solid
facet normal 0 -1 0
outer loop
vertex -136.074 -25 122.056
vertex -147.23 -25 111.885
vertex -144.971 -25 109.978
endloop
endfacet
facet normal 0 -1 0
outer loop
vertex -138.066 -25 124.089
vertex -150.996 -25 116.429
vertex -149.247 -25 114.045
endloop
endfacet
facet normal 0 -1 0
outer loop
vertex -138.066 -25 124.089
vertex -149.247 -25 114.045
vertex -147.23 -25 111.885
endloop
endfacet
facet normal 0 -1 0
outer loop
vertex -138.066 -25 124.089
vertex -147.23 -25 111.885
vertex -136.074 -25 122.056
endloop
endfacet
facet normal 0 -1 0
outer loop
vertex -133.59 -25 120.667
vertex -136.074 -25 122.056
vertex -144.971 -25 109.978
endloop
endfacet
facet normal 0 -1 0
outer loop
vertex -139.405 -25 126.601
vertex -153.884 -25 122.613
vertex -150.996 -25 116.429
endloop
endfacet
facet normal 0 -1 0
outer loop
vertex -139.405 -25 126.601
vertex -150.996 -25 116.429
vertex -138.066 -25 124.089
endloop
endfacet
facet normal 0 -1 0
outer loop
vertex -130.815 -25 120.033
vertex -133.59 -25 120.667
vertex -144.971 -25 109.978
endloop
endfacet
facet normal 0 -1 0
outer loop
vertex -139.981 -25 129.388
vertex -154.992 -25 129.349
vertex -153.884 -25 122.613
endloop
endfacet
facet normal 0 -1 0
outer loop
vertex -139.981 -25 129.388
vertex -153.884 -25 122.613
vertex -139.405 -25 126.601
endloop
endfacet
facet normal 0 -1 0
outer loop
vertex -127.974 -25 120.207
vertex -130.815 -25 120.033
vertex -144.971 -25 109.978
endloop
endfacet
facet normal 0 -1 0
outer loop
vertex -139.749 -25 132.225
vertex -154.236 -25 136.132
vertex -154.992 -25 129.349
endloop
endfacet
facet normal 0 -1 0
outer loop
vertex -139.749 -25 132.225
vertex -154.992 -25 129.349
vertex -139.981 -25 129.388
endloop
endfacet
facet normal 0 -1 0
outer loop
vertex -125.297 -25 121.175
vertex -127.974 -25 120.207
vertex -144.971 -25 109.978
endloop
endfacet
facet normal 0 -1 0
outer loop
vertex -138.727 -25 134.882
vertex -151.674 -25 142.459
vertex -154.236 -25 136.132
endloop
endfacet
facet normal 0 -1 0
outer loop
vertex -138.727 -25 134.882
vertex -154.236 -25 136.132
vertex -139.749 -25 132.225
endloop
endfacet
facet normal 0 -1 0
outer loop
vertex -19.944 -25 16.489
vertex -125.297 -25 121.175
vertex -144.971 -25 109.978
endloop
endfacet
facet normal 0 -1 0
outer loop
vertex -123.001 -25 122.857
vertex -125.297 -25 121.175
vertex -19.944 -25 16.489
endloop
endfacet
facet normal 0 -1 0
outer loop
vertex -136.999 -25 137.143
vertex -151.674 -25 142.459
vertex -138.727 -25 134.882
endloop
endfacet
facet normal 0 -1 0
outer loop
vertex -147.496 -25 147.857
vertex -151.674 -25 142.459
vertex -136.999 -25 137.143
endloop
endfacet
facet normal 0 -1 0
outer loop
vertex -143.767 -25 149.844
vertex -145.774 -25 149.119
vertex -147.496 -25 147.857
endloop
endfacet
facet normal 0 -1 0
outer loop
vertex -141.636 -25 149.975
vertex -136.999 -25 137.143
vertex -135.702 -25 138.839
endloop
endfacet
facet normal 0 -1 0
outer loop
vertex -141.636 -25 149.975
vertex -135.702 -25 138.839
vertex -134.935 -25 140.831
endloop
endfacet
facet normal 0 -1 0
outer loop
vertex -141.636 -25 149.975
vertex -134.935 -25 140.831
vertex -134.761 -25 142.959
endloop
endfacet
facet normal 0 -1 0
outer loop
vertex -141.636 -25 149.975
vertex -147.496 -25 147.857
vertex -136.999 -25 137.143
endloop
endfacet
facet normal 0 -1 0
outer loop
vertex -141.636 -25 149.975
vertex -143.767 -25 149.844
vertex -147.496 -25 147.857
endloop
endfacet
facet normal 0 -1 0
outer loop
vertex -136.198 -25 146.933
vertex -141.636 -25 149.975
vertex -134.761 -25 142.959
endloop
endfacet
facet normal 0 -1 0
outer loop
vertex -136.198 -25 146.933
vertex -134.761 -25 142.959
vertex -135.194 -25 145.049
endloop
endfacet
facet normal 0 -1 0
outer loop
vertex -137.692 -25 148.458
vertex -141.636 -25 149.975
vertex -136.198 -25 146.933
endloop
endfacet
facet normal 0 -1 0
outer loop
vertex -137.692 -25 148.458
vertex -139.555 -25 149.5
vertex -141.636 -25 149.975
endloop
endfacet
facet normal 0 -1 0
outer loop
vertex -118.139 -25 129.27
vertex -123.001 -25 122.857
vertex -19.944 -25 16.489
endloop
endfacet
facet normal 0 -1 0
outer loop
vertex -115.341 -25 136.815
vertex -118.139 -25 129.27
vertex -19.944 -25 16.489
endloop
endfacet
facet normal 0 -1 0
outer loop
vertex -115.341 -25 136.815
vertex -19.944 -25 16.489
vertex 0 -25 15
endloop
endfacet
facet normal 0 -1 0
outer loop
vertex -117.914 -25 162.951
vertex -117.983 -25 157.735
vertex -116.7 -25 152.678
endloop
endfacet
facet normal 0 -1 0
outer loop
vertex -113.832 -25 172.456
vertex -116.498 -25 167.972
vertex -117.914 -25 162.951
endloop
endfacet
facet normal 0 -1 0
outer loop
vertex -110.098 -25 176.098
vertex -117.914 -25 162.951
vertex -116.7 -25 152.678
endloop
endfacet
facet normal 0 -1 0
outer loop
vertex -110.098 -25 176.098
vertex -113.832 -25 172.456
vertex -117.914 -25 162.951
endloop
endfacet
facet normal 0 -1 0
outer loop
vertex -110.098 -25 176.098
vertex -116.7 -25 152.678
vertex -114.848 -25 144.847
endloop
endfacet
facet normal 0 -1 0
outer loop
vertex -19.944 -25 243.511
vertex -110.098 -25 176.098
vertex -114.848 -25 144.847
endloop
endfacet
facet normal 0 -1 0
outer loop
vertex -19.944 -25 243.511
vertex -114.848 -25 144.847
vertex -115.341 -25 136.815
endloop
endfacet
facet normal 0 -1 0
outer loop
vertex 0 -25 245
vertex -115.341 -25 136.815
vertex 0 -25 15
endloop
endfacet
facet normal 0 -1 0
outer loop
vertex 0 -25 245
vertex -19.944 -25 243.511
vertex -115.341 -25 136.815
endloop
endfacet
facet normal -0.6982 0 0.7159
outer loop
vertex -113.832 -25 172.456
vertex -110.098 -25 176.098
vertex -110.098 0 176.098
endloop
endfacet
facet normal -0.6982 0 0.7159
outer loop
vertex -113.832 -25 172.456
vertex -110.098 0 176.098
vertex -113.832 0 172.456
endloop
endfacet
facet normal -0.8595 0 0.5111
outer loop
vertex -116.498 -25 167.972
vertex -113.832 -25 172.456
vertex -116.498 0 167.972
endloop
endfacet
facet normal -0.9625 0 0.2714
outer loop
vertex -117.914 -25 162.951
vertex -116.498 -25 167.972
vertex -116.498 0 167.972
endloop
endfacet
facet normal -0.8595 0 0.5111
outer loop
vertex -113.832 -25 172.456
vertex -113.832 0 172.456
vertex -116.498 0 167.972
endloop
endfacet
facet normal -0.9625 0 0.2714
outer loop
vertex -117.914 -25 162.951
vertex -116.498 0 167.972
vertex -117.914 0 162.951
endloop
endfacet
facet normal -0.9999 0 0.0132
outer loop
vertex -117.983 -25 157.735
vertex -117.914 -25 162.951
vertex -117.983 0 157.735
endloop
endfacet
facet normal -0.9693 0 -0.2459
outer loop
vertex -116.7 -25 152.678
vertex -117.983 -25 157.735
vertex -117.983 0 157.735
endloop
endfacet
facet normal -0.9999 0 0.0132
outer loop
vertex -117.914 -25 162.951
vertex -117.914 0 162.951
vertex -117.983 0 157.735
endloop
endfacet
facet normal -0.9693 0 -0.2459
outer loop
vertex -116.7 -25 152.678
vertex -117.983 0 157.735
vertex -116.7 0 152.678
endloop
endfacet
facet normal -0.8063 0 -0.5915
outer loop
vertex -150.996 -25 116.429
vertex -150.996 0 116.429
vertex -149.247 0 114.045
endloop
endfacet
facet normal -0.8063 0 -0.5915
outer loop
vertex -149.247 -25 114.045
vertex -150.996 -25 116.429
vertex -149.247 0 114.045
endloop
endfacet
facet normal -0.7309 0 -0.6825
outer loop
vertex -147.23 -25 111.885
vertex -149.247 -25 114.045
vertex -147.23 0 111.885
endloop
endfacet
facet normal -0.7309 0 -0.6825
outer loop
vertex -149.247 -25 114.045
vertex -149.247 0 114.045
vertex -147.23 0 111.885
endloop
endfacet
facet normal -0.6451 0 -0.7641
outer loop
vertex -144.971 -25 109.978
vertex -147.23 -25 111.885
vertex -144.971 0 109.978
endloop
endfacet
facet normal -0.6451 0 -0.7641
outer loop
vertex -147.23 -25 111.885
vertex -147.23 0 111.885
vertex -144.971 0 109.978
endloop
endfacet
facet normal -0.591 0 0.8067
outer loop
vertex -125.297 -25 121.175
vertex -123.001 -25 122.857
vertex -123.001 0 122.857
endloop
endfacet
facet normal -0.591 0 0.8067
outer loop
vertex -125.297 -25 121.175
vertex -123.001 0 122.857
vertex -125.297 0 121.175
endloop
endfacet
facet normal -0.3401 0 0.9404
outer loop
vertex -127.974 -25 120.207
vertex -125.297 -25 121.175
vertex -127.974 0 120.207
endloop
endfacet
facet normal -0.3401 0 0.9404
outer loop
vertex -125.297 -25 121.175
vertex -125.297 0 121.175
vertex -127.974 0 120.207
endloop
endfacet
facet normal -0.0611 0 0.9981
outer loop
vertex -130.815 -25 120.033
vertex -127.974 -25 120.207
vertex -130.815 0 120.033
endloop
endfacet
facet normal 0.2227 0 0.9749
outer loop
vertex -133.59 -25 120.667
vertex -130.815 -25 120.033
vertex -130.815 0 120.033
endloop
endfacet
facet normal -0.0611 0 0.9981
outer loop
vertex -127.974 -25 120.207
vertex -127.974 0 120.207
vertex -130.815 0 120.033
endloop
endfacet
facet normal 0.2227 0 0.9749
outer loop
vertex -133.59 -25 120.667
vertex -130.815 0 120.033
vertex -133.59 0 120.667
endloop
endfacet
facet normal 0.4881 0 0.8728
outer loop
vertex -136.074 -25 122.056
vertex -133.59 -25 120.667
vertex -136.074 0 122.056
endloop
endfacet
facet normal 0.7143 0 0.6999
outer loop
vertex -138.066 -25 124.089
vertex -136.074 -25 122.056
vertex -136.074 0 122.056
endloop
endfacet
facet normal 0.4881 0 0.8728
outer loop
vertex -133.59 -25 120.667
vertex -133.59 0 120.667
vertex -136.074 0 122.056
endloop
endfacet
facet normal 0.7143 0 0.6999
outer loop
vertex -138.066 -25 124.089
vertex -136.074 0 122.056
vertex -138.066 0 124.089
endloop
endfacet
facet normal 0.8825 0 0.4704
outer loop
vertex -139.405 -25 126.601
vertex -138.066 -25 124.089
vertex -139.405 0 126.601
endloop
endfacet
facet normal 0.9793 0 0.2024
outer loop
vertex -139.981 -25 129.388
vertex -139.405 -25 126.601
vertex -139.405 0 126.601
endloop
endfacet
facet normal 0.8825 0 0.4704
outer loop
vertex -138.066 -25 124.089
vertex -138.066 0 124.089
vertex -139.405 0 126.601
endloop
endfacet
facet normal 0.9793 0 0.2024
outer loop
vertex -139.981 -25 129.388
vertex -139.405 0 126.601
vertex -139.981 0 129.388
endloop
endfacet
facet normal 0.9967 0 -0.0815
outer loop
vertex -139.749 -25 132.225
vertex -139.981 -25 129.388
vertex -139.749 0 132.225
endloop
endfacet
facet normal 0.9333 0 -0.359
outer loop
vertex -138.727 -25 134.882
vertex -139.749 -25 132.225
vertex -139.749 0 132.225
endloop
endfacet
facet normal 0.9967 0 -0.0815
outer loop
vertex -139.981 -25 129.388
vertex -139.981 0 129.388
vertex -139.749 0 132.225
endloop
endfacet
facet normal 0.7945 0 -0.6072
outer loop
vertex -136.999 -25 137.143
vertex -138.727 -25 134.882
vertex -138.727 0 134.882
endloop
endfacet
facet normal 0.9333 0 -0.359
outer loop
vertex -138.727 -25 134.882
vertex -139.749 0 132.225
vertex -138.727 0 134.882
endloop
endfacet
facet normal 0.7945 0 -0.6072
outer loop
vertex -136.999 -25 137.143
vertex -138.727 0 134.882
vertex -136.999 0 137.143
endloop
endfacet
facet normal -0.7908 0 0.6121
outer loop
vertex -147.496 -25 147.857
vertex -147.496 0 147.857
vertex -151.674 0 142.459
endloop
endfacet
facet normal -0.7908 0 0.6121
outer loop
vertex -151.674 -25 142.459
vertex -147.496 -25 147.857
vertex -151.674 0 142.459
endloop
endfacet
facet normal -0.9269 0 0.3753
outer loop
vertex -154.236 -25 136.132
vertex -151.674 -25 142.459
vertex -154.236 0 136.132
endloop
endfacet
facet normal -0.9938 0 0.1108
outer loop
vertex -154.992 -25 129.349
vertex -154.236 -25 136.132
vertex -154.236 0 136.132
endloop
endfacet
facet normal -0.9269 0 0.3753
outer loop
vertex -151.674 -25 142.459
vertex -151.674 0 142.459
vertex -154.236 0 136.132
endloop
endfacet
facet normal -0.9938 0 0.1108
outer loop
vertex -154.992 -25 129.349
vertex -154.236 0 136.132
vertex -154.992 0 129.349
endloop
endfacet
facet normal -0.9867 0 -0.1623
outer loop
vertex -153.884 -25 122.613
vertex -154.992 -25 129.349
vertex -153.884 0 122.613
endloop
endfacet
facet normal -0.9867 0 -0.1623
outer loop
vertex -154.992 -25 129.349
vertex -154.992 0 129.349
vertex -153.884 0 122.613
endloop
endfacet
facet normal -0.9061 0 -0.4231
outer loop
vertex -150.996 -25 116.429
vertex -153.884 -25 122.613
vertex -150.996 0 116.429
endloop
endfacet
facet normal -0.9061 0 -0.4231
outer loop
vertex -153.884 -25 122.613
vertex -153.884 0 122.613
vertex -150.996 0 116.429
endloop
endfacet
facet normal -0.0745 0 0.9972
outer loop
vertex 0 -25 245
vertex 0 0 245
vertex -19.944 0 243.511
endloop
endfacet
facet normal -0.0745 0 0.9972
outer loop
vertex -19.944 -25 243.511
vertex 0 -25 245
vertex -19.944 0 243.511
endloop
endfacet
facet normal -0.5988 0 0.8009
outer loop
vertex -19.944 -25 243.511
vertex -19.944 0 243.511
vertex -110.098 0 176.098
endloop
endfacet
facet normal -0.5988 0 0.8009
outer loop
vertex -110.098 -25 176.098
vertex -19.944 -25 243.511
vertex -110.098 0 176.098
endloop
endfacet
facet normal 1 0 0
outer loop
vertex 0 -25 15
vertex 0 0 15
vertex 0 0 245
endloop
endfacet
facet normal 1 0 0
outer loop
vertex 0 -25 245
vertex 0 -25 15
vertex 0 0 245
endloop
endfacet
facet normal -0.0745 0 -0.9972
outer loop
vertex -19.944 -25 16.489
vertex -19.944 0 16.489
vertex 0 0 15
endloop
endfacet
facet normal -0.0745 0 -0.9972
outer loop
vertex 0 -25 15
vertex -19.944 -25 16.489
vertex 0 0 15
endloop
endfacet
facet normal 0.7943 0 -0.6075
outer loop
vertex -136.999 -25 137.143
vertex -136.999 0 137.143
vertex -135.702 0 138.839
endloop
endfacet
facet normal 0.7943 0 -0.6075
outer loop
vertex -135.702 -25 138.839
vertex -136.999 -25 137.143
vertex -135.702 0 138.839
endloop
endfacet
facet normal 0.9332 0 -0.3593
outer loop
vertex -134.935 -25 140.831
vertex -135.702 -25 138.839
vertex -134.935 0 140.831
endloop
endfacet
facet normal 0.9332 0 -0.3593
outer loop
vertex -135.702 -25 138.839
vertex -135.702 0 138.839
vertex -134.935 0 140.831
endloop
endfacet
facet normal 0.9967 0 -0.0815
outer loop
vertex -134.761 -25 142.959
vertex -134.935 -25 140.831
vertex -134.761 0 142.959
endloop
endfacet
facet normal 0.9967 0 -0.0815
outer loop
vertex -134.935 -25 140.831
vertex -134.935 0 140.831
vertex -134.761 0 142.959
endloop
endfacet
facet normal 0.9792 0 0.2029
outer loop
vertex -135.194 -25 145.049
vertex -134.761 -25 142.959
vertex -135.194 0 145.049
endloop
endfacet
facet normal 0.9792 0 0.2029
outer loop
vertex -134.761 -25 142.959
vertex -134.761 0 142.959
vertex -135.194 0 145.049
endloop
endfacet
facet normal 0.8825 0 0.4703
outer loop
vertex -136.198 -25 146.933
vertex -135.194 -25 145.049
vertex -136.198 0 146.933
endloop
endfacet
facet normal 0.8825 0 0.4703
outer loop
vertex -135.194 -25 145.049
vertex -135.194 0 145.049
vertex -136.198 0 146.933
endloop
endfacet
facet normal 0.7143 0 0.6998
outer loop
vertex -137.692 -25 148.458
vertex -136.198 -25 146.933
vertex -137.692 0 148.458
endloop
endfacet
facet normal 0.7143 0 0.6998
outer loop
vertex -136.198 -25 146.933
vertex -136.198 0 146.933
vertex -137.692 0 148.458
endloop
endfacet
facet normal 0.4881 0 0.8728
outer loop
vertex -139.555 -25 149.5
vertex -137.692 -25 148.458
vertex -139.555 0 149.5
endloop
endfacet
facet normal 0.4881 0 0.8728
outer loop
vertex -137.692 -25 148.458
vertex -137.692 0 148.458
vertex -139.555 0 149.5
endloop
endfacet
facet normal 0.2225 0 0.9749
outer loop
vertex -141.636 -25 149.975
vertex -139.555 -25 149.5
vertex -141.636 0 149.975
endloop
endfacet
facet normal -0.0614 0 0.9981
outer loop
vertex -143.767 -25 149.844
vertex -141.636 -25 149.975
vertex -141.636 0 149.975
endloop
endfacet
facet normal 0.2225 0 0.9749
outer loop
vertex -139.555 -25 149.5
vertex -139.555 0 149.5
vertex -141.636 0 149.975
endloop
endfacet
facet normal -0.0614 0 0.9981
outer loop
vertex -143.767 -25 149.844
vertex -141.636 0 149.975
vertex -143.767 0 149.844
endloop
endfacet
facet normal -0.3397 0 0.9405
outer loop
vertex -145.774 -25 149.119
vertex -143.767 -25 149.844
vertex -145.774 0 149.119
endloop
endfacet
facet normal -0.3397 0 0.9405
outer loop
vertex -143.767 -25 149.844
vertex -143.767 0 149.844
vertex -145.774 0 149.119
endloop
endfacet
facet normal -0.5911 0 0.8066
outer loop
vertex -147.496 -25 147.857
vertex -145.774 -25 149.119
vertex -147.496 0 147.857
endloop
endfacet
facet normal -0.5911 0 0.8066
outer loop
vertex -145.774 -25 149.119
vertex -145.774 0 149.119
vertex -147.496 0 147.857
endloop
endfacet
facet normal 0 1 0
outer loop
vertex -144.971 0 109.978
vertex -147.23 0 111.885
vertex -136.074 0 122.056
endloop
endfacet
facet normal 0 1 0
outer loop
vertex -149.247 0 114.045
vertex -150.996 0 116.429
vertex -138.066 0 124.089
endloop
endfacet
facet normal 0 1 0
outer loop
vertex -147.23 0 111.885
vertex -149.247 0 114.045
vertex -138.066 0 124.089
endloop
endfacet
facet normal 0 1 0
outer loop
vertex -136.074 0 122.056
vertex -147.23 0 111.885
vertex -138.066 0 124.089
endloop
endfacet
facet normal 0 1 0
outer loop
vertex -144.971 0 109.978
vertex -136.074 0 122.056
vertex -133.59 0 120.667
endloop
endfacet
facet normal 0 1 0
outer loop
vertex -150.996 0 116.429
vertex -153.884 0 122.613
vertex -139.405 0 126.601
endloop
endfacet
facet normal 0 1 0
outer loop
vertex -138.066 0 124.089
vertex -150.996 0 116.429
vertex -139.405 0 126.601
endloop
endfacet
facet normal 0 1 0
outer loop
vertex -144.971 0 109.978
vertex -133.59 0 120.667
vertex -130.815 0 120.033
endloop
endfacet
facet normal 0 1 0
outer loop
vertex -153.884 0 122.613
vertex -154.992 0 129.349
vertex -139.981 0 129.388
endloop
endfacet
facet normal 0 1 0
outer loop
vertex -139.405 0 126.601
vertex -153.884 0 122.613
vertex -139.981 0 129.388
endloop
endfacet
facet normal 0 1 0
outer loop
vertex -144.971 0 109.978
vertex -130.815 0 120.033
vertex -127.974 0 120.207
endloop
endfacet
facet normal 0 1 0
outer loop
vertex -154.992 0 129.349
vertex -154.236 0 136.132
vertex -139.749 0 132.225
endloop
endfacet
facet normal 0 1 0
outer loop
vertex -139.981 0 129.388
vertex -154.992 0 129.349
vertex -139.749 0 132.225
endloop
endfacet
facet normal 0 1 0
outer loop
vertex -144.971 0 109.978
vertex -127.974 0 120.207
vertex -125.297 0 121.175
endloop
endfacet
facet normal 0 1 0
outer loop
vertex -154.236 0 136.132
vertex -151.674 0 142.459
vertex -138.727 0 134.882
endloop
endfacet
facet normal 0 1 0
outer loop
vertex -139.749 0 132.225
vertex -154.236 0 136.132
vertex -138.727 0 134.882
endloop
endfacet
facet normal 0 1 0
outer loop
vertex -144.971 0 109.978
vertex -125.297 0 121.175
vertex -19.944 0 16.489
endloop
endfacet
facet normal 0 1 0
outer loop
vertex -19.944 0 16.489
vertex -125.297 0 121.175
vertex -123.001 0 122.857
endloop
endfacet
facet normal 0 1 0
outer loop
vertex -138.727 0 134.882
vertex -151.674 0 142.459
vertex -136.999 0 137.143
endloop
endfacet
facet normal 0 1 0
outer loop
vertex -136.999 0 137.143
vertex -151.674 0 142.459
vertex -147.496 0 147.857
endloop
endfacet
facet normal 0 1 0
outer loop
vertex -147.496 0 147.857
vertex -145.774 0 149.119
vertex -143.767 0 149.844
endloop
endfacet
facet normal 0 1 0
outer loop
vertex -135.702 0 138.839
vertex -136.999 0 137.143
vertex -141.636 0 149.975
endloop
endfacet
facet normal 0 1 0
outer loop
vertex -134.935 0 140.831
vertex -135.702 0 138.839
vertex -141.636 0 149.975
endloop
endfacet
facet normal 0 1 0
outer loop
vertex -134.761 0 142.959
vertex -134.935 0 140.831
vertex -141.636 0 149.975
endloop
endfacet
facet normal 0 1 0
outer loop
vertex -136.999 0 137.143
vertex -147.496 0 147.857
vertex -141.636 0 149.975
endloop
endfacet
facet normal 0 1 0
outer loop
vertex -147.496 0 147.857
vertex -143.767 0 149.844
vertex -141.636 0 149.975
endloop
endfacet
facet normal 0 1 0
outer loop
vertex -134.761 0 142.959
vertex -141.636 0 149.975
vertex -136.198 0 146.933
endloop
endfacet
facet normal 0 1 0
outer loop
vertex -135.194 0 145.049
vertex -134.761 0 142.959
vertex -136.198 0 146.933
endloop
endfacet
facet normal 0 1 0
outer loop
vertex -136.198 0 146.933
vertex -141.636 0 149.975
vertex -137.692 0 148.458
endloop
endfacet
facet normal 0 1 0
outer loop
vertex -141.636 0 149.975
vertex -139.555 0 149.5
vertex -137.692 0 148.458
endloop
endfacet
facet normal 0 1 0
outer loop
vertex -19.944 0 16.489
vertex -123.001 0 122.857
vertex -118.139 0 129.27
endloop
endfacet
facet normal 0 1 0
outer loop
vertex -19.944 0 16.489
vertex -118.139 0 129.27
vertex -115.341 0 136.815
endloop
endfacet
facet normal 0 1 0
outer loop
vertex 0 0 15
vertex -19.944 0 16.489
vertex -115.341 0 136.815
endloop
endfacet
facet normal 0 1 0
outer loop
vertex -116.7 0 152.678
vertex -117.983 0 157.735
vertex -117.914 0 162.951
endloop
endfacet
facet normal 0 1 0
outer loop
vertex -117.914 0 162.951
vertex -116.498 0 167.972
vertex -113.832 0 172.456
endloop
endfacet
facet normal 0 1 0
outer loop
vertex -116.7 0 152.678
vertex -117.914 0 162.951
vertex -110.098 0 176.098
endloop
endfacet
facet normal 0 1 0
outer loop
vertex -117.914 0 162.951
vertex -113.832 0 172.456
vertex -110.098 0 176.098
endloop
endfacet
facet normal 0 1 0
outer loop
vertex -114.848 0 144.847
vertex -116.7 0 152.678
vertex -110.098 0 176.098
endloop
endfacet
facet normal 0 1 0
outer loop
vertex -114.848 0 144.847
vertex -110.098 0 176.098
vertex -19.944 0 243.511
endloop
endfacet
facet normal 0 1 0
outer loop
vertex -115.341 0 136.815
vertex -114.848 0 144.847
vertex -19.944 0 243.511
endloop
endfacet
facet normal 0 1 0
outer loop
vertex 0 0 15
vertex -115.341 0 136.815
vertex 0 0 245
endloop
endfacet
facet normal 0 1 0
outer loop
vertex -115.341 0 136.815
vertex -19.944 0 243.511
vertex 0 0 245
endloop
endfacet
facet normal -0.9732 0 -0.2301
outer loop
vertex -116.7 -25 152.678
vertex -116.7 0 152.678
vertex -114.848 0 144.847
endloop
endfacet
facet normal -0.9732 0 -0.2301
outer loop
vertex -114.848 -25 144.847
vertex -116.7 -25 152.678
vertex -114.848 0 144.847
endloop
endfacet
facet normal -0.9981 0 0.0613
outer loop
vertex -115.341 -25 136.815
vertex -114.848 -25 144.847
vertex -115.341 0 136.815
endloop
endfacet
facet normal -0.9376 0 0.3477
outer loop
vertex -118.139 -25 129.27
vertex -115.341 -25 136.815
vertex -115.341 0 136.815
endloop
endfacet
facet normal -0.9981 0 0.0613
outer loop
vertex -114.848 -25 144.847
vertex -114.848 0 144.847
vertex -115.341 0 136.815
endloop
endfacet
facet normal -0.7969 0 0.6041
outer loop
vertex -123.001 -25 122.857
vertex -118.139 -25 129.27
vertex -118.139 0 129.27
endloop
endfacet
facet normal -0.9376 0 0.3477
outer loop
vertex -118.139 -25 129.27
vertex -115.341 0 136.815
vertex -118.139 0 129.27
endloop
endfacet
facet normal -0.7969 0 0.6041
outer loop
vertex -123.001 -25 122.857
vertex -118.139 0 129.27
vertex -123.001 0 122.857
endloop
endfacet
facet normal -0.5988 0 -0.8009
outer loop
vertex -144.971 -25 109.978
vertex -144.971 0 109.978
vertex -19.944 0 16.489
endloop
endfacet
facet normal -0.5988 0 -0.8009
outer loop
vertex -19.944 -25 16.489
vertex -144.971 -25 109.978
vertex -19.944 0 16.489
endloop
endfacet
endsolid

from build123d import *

# Parameters (mm, degrees)
F1_DEPTH = 25


with BuildPart() as f1:
    # F0 (on Front) → F1 (new body)
    with BuildSketch(Plane.XZ):
        with BuildLine():
            ThreePointArc((-123.001458, 122.857143), (-137.142857, 123.001458), (-136.998542, 137.142857))
            ThreePointArc((-136.998542, 137.142857), (-136.890306, 147.748907), (-147.496355, 147.857143))
            ThreePointArc((-147.496355, 147.857143), (-154.846467, 132.766417), (-150.995626, 116.428571))
            ThreePointArc((-150.995626, 116.428571), (-148.270306, 112.935536), (-144.97119, 109.978425))
            Line((-144.97119, 109.978425), (-19.94447, 16.489339))
            Line((-19.94447, 16.489339), (0, 15))
            Line((0, 15), (0, 245))
            Line((0, 245), (-19.94447, 243.510661))
            Line((-19.94447, 243.510661), (-110.097784, 176.098264))
            ThreePointArc((-110.097784, 176.098264), (-117.370449, 165.507995), (-116.70046, 152.678476))
            ThreePointArc((-116.70046, 152.678476), (-115.341488, 136.814996), (-123.001458, 122.857143))
        make_face()
    extrude(amount=F1_DEPTH)


solid = f1.part
